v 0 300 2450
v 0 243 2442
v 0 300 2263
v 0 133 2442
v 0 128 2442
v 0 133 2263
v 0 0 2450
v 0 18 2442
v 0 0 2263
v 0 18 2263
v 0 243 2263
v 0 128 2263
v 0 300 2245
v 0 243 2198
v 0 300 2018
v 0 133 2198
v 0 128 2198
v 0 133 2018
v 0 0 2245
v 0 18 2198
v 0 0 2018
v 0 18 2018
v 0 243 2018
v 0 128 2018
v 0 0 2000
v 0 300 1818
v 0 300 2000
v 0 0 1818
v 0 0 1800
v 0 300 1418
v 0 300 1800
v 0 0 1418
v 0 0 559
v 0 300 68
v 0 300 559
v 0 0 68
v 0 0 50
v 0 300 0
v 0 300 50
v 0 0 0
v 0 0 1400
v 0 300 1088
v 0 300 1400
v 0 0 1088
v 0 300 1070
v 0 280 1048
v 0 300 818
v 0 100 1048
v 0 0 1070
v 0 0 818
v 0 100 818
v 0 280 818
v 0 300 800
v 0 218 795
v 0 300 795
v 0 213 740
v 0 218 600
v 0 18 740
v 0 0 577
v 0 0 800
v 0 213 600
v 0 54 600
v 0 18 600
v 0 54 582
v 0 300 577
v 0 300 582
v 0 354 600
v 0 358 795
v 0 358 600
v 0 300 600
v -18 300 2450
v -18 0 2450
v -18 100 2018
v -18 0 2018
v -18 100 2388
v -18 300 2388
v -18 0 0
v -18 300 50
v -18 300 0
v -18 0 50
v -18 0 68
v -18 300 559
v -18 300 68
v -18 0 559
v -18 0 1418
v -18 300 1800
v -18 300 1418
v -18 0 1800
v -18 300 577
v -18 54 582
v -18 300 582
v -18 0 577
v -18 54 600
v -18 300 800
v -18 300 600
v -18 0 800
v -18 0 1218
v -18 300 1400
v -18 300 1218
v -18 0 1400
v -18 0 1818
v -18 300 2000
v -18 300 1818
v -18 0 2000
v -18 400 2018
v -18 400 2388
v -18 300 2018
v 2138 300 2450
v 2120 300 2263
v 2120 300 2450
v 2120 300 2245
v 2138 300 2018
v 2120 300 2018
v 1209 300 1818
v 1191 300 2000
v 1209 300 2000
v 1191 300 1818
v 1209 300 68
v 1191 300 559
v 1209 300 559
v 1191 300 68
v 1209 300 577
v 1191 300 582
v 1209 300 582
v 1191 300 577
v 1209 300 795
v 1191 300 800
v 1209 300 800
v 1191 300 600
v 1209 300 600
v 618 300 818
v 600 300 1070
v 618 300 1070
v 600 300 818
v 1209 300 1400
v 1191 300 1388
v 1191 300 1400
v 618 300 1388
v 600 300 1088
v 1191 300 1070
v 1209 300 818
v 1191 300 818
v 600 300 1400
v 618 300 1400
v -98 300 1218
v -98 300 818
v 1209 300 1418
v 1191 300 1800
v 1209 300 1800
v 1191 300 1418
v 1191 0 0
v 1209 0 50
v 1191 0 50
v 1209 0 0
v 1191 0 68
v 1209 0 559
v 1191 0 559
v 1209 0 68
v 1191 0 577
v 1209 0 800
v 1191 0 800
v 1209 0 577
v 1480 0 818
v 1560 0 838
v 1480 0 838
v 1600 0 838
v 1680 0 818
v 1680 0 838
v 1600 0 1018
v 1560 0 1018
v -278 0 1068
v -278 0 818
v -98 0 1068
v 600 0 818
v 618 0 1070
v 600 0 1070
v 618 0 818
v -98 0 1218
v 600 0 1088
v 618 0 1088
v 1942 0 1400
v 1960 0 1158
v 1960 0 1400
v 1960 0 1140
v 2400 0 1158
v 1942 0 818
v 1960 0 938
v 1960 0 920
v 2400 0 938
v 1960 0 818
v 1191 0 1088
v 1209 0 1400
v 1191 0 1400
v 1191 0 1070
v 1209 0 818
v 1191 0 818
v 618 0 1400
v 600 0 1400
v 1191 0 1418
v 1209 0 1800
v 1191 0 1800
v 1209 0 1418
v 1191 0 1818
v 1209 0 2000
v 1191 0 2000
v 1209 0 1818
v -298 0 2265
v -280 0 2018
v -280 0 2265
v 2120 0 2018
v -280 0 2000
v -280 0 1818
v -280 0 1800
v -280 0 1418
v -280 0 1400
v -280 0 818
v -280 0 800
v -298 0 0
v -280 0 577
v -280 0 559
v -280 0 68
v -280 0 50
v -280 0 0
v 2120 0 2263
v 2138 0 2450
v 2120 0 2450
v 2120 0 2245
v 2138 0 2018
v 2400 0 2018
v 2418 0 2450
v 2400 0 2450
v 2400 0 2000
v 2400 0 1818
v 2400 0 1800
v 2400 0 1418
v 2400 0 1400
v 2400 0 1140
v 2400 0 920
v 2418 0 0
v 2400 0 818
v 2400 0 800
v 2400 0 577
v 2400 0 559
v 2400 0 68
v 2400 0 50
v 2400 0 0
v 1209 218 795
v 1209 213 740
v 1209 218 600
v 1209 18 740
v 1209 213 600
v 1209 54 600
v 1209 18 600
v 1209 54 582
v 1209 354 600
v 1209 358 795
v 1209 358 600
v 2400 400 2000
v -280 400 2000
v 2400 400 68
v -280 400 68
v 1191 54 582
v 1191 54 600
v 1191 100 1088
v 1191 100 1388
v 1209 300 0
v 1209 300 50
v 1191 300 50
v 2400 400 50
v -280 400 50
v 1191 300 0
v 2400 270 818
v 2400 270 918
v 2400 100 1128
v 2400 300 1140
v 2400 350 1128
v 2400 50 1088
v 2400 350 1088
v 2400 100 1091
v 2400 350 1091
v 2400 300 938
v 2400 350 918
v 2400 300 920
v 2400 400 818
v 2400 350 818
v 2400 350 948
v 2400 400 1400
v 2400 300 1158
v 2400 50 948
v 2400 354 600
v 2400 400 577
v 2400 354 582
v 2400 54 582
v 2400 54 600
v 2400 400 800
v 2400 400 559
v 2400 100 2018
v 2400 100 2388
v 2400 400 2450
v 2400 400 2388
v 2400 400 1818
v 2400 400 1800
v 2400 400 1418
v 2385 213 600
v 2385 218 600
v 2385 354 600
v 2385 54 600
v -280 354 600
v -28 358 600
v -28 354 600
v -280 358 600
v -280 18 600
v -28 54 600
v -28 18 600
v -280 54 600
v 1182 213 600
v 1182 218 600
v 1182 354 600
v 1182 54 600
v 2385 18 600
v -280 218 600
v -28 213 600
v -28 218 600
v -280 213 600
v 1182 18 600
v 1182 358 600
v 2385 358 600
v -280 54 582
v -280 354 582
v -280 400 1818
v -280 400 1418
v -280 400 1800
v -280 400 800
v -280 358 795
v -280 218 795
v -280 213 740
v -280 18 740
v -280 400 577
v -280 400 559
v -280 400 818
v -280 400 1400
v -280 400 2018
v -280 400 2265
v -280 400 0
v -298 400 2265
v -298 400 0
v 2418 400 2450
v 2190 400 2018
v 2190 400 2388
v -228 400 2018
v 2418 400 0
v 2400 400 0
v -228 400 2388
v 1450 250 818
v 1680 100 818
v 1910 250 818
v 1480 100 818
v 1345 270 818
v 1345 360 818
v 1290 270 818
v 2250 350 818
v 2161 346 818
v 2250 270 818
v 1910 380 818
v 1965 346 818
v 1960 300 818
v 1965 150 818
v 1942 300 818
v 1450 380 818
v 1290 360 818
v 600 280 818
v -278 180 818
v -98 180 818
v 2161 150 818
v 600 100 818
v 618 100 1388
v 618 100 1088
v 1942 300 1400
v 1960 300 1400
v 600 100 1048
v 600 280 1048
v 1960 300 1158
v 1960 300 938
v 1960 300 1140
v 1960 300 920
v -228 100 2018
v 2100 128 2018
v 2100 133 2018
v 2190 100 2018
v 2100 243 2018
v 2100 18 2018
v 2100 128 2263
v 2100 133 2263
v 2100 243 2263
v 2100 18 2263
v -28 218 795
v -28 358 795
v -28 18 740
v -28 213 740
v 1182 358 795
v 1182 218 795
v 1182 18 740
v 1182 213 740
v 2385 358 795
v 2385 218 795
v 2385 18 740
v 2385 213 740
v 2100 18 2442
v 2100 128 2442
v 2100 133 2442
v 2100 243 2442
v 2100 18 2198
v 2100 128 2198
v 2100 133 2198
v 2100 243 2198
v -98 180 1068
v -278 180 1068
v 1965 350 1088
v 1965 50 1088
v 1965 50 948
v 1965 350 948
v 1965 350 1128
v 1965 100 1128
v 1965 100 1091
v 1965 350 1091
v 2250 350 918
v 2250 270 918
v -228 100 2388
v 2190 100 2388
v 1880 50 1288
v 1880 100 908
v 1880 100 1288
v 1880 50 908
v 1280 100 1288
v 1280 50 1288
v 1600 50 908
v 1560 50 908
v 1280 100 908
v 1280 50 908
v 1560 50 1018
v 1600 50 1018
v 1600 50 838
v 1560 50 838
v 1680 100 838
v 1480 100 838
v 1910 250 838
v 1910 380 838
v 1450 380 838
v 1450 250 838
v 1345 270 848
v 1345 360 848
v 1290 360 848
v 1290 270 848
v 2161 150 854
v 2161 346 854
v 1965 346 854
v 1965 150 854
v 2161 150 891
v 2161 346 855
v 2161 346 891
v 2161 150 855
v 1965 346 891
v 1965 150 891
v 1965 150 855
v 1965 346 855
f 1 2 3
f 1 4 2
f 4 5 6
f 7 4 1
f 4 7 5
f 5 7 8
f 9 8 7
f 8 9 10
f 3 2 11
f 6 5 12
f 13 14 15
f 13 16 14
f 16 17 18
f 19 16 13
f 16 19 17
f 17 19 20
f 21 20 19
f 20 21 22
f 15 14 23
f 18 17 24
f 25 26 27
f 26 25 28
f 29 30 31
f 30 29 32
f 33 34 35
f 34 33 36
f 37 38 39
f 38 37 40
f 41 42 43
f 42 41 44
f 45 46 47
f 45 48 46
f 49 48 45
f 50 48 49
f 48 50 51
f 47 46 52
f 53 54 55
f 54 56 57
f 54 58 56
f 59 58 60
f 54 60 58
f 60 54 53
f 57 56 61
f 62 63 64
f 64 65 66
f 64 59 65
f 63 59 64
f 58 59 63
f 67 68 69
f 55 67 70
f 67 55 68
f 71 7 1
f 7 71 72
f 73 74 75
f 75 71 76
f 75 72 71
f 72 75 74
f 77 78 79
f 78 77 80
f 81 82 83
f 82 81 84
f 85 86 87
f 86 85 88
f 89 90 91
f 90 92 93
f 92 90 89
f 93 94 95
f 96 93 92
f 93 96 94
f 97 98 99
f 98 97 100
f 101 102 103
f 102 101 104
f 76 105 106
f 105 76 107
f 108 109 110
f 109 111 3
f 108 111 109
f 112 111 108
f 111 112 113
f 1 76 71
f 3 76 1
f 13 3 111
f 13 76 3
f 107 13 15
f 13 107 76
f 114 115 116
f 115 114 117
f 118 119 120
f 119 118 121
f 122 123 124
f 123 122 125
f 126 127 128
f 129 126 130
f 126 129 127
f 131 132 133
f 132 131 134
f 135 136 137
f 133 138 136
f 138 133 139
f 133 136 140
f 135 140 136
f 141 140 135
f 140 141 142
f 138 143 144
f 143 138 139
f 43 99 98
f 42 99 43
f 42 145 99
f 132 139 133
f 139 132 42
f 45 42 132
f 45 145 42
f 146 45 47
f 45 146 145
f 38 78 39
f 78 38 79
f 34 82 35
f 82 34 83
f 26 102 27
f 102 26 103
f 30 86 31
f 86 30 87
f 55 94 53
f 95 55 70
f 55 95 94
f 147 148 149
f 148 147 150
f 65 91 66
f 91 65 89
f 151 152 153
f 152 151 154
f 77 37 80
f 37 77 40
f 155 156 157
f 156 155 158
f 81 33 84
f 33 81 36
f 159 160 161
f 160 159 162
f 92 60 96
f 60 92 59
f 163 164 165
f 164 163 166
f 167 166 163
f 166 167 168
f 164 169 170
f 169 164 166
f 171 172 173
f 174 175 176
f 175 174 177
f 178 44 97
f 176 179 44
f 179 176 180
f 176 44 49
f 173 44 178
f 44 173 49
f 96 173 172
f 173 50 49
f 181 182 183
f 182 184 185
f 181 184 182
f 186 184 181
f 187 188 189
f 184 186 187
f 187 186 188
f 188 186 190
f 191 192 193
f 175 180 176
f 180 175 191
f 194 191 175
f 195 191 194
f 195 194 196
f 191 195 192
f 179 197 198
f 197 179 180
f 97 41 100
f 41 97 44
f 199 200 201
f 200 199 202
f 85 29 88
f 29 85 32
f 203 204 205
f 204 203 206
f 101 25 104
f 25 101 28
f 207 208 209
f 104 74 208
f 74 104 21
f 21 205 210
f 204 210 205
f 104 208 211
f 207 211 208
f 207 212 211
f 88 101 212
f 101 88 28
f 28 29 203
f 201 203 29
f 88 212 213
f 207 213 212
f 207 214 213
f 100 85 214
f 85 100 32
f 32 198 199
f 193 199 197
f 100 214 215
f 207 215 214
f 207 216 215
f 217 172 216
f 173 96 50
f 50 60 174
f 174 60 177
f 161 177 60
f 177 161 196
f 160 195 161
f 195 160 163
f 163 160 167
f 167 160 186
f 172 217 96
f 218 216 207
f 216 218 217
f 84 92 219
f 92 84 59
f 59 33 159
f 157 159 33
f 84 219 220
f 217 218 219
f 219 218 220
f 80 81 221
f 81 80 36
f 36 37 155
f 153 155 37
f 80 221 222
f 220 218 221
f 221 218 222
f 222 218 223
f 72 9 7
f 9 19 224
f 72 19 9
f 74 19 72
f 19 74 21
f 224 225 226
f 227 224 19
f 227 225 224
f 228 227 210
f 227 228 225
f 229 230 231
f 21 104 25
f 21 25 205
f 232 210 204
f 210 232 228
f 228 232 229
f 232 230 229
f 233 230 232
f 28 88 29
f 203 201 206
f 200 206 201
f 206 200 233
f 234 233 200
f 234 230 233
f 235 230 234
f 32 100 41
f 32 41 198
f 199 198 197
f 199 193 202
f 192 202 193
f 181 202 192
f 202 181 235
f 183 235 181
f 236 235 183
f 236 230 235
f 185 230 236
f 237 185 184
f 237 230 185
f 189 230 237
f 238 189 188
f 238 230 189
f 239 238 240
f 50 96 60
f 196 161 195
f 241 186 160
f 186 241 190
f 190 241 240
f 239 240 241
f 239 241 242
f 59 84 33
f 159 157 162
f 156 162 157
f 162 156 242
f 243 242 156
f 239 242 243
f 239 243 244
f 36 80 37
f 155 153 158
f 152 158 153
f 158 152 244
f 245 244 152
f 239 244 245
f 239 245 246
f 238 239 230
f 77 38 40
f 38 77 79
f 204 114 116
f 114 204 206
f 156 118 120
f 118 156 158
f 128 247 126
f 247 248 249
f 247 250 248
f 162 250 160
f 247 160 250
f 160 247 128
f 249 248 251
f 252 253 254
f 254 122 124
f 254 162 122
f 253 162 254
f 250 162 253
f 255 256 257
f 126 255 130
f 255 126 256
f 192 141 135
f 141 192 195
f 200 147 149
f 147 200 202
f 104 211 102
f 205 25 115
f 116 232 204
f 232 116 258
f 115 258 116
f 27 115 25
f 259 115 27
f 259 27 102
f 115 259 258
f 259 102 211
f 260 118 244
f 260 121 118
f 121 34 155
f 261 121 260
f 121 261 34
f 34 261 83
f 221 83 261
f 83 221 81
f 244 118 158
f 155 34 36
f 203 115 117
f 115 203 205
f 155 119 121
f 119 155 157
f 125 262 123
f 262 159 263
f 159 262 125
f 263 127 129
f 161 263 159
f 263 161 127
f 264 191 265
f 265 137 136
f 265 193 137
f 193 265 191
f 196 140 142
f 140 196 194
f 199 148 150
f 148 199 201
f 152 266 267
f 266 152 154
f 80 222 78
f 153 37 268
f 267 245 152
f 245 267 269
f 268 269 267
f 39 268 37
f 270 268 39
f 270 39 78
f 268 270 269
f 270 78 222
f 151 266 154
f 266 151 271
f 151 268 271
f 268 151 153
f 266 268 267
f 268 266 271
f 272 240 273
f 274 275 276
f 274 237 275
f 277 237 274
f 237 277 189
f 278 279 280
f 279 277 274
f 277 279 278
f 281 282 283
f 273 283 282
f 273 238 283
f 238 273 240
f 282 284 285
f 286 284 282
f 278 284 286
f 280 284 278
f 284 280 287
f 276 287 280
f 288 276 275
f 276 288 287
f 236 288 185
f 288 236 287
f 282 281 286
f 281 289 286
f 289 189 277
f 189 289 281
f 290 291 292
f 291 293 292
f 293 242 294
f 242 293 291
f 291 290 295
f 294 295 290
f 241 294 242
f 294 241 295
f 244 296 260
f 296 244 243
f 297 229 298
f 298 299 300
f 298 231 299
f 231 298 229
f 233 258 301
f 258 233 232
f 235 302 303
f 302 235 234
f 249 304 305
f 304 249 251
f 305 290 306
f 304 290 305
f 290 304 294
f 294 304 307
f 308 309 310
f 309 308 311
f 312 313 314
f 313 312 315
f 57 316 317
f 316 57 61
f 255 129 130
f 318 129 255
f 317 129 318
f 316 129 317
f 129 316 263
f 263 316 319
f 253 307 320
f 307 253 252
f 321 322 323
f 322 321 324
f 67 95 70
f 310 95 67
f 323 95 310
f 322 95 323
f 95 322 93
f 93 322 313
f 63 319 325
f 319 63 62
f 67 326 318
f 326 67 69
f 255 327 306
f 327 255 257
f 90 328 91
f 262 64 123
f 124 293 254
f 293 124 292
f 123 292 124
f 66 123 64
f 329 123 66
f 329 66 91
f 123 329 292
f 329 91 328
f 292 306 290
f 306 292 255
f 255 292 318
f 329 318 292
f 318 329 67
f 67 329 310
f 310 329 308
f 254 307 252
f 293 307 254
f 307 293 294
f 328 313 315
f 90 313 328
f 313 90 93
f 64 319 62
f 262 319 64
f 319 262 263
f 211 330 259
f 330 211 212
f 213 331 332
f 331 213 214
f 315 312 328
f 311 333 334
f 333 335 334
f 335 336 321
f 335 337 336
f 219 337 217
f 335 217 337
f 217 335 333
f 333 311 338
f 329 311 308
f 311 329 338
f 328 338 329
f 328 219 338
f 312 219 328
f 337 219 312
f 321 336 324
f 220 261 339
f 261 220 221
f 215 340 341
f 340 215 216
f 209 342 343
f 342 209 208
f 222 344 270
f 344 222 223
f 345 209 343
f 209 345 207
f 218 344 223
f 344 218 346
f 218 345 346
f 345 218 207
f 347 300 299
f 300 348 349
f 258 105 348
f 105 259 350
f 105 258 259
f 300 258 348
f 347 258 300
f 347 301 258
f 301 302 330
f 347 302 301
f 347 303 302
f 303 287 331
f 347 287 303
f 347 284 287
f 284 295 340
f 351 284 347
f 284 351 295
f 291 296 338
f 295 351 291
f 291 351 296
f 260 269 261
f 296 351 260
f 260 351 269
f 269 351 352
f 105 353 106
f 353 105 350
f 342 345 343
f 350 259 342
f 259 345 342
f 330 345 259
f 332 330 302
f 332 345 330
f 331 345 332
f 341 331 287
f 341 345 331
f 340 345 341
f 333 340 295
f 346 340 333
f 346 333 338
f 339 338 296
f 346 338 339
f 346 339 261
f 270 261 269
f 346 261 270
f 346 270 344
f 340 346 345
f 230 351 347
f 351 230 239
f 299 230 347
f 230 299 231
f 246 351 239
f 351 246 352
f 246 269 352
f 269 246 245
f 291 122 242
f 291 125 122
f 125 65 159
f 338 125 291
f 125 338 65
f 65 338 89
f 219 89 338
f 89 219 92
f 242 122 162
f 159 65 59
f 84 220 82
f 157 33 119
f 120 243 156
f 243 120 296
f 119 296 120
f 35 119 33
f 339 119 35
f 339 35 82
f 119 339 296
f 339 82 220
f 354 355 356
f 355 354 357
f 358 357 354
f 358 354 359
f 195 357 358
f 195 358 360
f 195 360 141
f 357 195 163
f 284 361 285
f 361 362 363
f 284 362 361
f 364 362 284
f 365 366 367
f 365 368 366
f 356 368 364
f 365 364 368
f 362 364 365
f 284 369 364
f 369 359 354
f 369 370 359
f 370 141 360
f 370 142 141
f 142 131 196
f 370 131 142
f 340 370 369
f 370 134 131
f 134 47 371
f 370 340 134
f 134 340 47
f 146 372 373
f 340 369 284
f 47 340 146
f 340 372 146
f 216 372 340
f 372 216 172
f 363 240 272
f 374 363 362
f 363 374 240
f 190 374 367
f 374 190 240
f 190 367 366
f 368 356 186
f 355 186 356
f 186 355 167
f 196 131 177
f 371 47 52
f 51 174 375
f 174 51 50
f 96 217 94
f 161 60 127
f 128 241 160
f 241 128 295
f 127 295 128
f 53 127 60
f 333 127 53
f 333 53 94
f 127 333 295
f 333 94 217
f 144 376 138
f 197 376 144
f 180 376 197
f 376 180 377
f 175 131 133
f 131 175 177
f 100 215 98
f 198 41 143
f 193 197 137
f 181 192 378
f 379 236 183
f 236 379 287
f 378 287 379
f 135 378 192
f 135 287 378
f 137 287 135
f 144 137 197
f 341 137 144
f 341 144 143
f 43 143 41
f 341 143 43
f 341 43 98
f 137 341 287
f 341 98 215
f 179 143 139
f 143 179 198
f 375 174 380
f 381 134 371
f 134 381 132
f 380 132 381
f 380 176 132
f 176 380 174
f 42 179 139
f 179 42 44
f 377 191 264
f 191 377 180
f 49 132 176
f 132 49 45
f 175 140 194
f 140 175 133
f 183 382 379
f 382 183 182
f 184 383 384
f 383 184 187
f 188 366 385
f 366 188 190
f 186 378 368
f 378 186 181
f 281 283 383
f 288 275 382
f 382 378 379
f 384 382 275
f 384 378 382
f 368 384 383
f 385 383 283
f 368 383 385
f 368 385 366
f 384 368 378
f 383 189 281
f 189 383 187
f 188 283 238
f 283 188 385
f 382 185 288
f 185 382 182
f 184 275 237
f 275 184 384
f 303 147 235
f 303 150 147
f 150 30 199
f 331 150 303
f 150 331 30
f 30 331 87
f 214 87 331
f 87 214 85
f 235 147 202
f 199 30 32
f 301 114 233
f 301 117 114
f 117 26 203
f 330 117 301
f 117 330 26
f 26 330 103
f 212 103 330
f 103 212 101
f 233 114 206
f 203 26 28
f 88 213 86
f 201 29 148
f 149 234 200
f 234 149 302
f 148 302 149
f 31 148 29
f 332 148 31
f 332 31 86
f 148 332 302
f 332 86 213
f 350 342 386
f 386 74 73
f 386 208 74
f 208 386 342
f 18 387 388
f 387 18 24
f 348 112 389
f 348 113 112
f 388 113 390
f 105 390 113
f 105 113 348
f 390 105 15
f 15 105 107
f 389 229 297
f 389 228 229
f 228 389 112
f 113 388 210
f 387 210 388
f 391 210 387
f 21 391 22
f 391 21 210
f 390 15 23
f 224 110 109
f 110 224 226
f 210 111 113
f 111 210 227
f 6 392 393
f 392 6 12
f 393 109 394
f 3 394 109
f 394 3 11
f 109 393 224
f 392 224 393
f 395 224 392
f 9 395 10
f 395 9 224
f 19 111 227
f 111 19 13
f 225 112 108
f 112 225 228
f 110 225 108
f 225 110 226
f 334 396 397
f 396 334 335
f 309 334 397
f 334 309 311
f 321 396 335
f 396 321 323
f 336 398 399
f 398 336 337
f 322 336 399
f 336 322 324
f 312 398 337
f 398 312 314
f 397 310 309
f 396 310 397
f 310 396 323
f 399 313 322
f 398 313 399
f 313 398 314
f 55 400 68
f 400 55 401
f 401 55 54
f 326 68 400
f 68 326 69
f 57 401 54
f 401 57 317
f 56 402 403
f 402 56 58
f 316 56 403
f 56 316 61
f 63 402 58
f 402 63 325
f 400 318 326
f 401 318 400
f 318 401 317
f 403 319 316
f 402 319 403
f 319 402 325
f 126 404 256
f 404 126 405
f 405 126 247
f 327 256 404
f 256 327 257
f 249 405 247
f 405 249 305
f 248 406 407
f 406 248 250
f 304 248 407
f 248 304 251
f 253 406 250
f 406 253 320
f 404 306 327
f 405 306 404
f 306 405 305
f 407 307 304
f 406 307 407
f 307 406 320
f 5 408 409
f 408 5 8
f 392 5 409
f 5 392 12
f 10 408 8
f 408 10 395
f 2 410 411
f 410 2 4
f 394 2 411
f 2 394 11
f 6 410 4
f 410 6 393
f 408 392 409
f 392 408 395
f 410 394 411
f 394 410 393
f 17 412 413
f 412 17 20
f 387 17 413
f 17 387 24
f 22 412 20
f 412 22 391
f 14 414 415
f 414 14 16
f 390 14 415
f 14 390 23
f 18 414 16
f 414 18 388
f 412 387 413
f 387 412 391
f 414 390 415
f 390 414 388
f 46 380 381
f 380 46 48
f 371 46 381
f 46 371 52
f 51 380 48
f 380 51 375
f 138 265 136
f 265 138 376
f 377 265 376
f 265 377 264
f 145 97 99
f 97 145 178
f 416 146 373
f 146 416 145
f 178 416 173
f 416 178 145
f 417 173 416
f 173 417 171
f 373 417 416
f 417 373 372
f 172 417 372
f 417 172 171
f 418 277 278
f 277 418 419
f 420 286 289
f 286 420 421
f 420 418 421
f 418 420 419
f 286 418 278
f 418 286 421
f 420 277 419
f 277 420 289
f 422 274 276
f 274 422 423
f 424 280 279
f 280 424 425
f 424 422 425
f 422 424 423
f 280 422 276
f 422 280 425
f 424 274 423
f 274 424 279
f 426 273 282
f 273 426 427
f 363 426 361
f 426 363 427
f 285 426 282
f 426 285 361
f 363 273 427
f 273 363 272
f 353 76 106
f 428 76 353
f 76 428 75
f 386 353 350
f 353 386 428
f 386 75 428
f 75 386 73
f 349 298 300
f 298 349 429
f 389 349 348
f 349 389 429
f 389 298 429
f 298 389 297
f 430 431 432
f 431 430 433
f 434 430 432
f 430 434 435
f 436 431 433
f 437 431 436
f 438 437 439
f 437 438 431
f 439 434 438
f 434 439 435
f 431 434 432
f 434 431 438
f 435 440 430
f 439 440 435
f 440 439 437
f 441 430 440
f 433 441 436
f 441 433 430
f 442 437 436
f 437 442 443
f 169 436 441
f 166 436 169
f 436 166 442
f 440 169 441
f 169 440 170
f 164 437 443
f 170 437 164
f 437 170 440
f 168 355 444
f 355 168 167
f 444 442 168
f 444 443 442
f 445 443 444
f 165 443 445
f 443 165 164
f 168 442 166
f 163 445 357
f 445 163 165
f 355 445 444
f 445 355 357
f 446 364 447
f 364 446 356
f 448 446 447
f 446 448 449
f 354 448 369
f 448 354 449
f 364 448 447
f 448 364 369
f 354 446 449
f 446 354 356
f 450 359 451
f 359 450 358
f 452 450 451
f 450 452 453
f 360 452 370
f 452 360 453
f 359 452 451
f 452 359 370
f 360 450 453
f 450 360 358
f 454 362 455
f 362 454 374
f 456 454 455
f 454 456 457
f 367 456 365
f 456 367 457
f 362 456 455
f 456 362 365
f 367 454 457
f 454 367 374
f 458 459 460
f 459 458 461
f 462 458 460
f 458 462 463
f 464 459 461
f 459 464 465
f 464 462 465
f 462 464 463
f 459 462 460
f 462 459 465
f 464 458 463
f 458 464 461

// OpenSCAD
GAP = 20*0;
PLEN = 2400; // plank length
PTCK =   18; // plank thickness
XWID =  280; // extention width

DLEN = (PLEN+XWID) / 2 +20; // door length
DTCK = 5;

WID0 = 200; // width 1
WID1 = 300; // width 1
WID2 = 400; // width 2

PHIG = 50; // plinth height

SHIFT = PTCK*0; // front-shift intermediate vplancks

//////////////////////////////////////////////////
module _vplank(length, xpos, zpos, width) {
	color("peru")
	translate([xpos, 0, zpos + GAP])
	cube([PTCK, width, length - GAP*2]);
	echo("Plank " , width, length);
}
module vplank1(length, xpos, zpos=0)
       _vplank(length, xpos, zpos, WID1);
module vplank2(length, xpos, zpos=0)
       _vplank(length, xpos, zpos, WID2);
//////////////////////////////////////////////////
module _hplank(length, zpos, xpos, width) {
	color("peru")
	translate([xpos + GAP, 0, zpos])
	cube([length - GAP*2, width, PTCK]);
	echo("Plank " , width, length);
}
module hplank0(length, zpos, xpos=0)
       _hplank(length, zpos, xpos, WID0);
module hplank1(length, zpos, xpos=0)
       _hplank(length, zpos, xpos, WID1);
module hplank2(length, zpos, xpos=0)
       _hplank(length, zpos, xpos, WID2);
//////////////////////////////////////////////////
module _door(length, height, xpos, zpos, is_front) {
	DTCK = 5;
	depth = WID2-5 - DTCK * (is_front?1:2.5);
if(0)
	translate([xpos, depth, zpos])
	cube([length, DTCK, height]);	
}

module door(length, height, xpos, zpos, is_front)
	color("white")
	_door(length, height, xpos, zpos, is_front);

module glassdoor(length, height, xpos, zpos, is_front)
	%_door(length, height, xpos, zpos, is_front);

//////////////////////////////////////////////////
module object(w, h, d, x, y, f=0) {
	color(rands(0, 1, 3))
	translate([x+GAP, f+GAP, y+GAP])
	cube([w-GAP*2, d-GAP*2, h-GAP*2]);
}
//////////////////////////////////////////////////

module shelf()
{
	// vertical
	
	// - rightmost
//	vplank2(PLEN - 185, -XWID -PTCK, 50);
//	vplank2(50, -XWID -PTCK, 0);

	vplank2(PLEN - 185 + 50, -XWID -PTCK, 50 -50);
	
	// - right
	translate([0, SHIFT, 0]) {
		vplank1(PLEN, -PTCK, 50);
		vplank1(50, -PTCK, 0);
	}
	
	// - intermediate
	translate([0, SHIFT, 0]) {
		vplank1(PLEN - PTCK - 450, PLEN/2 - PTCK/2, 50 + PTCK);
		vplank1(50, PLEN/2 - PTCK/2, 0);
	}
	
	// - left
	vplank2(PLEN, PLEN, 50);
	vplank2(50, PLEN, 0);
	
	// plinth
%//	color([.25, 0, 0])
	translate([-XWID, WID2 - 40, 0])
	cube([PLEN + XWID, 20, PHIG]);
	
	// bottom trunk
	hplank2(PLEN, PHIG);
	hplank2(XWID, PHIG, -XWID);
	
	hplank2(PLEN, 800 - 200 -PTCK*2 -5);
	hplank2(XWID, 800 - 200 -PTCK*2 -5, -XWID);
	
	door(DLEN, 600-PTCK-PHIG -PTCK*2 -5, PLEN-DLEN, PHIG+PTCK, true);
	door(DLEN, 600-PTCK-PHIG -PTCK*2 -5,     -XWID, PHIG+PTCK, false);
	
	// spare plank
if(0)
	translate([0, PTCK, PHIG+PTCK])
	rotate([90, 0, 0])
	#hplank2(PLEN, 0);
	
	// dvds
	// - drawer
#	translate([0, PTCK*3, 0]) {
		hplank1(PLEN, 800 - 200 -PTCK);
		hplank1(XWID, 800 - 200 -PTCK, -XWID);
	}
	
	hplank2(PLEN, 800);
	hplank2(XWID, 800, -XWID);
	
	// mid right shelves
	translate([0, SHIFT, 0])
	vplank1(600 - PTCK, PLEN/4, 800 + PTCK);
	hplank1(PLEN/2, 800 + 270);
	
	// mid left shelves: computer & hifi
	translate([0, SHIFT, 0])
	vplank1(600 - PTCK, PLEN - PTCK - 440, 800 + PTCK);
	//hplank0(PLEN/2 - PTCK*1.5 - 440, 900, PLEN/2 + PTCK/2);
	
	hplank1(440,  920, PLEN-440);
	hplank1(440, 1140, PLEN-440);
	
	// top trunk
	hplank2(PLEN, 1400);
	hplank2(XWID, 1400, -XWID);
	
	hplank2(PLEN, 1800);
	hplank2(XWID, 1800, -XWID);
	
	door(DLEN, 400-PTCK, PLEN-DLEN, 1400+PTCK, true);
	door(DLEN, 400-PTCK,     -XWID, 1400+PTCK, false);
	
	// top showcase
	hplank2(PLEN, 2000);
	hplank2(XWID, 2000, -XWID);
	
	glassdoor(DLEN, 200, PLEN-DLEN, 1800, true);
	glassdoor(DLEN, 200,     -XWID, 1800, false);
	
	// top bookcase
	hplank1(PLEN - XWID, 2245);
	
	translate([0, -SHIFT, 0])
	vplank1(450-PTCK, PLEN - XWID, 2000 + PTCK);
	
	//hplank1(XWID - PTCK, 2245, -XWID);
}

module dvds() {
	///////////////////////////////////////////////////////
	// DVDs: 20 sets, 360 DVDs
	
	// - 42 DVDs
	translate([-XWID, PTCK, 0])
	for (i = [0:20]) {
		object(12, 195, 140, i*12, 600, 200);
		object(12, 140, 195, i*12, 600);
	}
	
	// - 20 DVD sets
	translate([0, PTCK, 0])
	for (i = [0:9]) {
		object(45, 195, 140, i*45, 600, 200);
		object(45, 140, 195, i*45, 600);
	}
	
	// - 122 DVDs
	translate([10*45, PTCK, 0])
	for (i = [1:61]) {
		translate([(i-1)*12, 0, 0]) {
			object(12, 195, 140, 0, 600, 200);
			object(12, 140, 195, 0, 600);
		}
	}
	
	// 196 DVDs
	translate([PLEN/2 + PTCK/2, PTCK, 0])
	for (i = [0:97]) {
		object(12, 195, 140, i*12, 600, 200);
		object(12, 140, 195, i*12, 600);
	}
}

module books() {	
	///////////////////////////////////////////////////////
	// Books
	
	// 336 Pocket books
	
	// - 168 books
	translate([0, PTCK, 0])
	for (i = [0:83]) {
		object(25, 180, 110, i*25, 2262, 0);
		object(25, 180, 110, i*25, 2262, 115);
	}
	
	// - 168 books
	translate([0, PTCK, 0])
	for (i = [0:83]) {
		object(25, 180, 110, i*25, 2000+PTCK, 0);
		object(25, 180, 110, i*25, 2000+PTCK, 115);
	}
	
	// 40 Cook books
	for (i = [0:39]) {
		object(15, 230, 180, i*15, 800+PTCK, 100);
	}
	
	// 40 albums
	for (i = [0:39]) {
		object(15, 300, 200, i*15 + PLEN/4, 1070+PTCK, 100);
	}
	
	// atlas, dicts
	for (i = [1:2]) {
		object(40, 400, 300, -PTCK - i*40, 800+PTCK);
	}
	for (i = [1:3]) {
		object(60, 250, 180, -PTCK - 2*40 - i * 60, 800+PTCK);
	}	
}

module speakers() {
	///////////////////////////////////////////////////////
	// Speakers
	
	color("black") {
		object(210, 370, 300, -PTCK-210, 2000+PTCK, 100);
		object(210, 370, 300,  PLEN-210, 2000+PTCK, 100);
	}
}

module computer() {
	//////////////////////////////////////////////////
	// Computer
	
	// - screen
	translate([80, 0, 0])
	color("silver") {
		object(600, 380, 50, PLEN/2, 800 + PTCK + 90, 50);
		object(40, 200, 50, PLEN/2 + 300-20, 800 + PTCK, 0);
		object(200, 20, 100, PLEN/2 + 300-100, 800 + PTCK, 0);
	}
	
	// keyboard+mouse
	color("silver")
	object(460, 20, 130, PLEN/2 + 250, 800 + PTCK, 250);

	color("silver")
	object(55, 30, 90, PLEN/2 + 90, 800 + PTCK, 270);

	// - macmini + DVD
	color("silver")
	object(196, 36, 196, PLEN-440 + 5, 800 + PTCK, 150);
	color("white")
	object(196, 36, 196, PLEN-440 + 5, 800 + PTCK + 37, 150);
}

module hifi() {	
	//////////////////////////////////////////////////
	// Hifi
	
	// - receiver
	color([.25, .25, .25])
	object(435, 150-10, 300, PLEN-435, 920+PTCK+10, 50);
	
	// - DVD player
	color("black")
	object(435, 40-3, 250, PLEN-435, 920+PTCK+150+3, 100);
	
	// - squeezebox
	color([.25, .25, .25])
	object(150, 100, 80, PLEN-150, 800+PTCK, 270);
}

if (1)
{
	shelf();
	dvds();	
	books();
	hifi();
	speakers();
	computer();
}
